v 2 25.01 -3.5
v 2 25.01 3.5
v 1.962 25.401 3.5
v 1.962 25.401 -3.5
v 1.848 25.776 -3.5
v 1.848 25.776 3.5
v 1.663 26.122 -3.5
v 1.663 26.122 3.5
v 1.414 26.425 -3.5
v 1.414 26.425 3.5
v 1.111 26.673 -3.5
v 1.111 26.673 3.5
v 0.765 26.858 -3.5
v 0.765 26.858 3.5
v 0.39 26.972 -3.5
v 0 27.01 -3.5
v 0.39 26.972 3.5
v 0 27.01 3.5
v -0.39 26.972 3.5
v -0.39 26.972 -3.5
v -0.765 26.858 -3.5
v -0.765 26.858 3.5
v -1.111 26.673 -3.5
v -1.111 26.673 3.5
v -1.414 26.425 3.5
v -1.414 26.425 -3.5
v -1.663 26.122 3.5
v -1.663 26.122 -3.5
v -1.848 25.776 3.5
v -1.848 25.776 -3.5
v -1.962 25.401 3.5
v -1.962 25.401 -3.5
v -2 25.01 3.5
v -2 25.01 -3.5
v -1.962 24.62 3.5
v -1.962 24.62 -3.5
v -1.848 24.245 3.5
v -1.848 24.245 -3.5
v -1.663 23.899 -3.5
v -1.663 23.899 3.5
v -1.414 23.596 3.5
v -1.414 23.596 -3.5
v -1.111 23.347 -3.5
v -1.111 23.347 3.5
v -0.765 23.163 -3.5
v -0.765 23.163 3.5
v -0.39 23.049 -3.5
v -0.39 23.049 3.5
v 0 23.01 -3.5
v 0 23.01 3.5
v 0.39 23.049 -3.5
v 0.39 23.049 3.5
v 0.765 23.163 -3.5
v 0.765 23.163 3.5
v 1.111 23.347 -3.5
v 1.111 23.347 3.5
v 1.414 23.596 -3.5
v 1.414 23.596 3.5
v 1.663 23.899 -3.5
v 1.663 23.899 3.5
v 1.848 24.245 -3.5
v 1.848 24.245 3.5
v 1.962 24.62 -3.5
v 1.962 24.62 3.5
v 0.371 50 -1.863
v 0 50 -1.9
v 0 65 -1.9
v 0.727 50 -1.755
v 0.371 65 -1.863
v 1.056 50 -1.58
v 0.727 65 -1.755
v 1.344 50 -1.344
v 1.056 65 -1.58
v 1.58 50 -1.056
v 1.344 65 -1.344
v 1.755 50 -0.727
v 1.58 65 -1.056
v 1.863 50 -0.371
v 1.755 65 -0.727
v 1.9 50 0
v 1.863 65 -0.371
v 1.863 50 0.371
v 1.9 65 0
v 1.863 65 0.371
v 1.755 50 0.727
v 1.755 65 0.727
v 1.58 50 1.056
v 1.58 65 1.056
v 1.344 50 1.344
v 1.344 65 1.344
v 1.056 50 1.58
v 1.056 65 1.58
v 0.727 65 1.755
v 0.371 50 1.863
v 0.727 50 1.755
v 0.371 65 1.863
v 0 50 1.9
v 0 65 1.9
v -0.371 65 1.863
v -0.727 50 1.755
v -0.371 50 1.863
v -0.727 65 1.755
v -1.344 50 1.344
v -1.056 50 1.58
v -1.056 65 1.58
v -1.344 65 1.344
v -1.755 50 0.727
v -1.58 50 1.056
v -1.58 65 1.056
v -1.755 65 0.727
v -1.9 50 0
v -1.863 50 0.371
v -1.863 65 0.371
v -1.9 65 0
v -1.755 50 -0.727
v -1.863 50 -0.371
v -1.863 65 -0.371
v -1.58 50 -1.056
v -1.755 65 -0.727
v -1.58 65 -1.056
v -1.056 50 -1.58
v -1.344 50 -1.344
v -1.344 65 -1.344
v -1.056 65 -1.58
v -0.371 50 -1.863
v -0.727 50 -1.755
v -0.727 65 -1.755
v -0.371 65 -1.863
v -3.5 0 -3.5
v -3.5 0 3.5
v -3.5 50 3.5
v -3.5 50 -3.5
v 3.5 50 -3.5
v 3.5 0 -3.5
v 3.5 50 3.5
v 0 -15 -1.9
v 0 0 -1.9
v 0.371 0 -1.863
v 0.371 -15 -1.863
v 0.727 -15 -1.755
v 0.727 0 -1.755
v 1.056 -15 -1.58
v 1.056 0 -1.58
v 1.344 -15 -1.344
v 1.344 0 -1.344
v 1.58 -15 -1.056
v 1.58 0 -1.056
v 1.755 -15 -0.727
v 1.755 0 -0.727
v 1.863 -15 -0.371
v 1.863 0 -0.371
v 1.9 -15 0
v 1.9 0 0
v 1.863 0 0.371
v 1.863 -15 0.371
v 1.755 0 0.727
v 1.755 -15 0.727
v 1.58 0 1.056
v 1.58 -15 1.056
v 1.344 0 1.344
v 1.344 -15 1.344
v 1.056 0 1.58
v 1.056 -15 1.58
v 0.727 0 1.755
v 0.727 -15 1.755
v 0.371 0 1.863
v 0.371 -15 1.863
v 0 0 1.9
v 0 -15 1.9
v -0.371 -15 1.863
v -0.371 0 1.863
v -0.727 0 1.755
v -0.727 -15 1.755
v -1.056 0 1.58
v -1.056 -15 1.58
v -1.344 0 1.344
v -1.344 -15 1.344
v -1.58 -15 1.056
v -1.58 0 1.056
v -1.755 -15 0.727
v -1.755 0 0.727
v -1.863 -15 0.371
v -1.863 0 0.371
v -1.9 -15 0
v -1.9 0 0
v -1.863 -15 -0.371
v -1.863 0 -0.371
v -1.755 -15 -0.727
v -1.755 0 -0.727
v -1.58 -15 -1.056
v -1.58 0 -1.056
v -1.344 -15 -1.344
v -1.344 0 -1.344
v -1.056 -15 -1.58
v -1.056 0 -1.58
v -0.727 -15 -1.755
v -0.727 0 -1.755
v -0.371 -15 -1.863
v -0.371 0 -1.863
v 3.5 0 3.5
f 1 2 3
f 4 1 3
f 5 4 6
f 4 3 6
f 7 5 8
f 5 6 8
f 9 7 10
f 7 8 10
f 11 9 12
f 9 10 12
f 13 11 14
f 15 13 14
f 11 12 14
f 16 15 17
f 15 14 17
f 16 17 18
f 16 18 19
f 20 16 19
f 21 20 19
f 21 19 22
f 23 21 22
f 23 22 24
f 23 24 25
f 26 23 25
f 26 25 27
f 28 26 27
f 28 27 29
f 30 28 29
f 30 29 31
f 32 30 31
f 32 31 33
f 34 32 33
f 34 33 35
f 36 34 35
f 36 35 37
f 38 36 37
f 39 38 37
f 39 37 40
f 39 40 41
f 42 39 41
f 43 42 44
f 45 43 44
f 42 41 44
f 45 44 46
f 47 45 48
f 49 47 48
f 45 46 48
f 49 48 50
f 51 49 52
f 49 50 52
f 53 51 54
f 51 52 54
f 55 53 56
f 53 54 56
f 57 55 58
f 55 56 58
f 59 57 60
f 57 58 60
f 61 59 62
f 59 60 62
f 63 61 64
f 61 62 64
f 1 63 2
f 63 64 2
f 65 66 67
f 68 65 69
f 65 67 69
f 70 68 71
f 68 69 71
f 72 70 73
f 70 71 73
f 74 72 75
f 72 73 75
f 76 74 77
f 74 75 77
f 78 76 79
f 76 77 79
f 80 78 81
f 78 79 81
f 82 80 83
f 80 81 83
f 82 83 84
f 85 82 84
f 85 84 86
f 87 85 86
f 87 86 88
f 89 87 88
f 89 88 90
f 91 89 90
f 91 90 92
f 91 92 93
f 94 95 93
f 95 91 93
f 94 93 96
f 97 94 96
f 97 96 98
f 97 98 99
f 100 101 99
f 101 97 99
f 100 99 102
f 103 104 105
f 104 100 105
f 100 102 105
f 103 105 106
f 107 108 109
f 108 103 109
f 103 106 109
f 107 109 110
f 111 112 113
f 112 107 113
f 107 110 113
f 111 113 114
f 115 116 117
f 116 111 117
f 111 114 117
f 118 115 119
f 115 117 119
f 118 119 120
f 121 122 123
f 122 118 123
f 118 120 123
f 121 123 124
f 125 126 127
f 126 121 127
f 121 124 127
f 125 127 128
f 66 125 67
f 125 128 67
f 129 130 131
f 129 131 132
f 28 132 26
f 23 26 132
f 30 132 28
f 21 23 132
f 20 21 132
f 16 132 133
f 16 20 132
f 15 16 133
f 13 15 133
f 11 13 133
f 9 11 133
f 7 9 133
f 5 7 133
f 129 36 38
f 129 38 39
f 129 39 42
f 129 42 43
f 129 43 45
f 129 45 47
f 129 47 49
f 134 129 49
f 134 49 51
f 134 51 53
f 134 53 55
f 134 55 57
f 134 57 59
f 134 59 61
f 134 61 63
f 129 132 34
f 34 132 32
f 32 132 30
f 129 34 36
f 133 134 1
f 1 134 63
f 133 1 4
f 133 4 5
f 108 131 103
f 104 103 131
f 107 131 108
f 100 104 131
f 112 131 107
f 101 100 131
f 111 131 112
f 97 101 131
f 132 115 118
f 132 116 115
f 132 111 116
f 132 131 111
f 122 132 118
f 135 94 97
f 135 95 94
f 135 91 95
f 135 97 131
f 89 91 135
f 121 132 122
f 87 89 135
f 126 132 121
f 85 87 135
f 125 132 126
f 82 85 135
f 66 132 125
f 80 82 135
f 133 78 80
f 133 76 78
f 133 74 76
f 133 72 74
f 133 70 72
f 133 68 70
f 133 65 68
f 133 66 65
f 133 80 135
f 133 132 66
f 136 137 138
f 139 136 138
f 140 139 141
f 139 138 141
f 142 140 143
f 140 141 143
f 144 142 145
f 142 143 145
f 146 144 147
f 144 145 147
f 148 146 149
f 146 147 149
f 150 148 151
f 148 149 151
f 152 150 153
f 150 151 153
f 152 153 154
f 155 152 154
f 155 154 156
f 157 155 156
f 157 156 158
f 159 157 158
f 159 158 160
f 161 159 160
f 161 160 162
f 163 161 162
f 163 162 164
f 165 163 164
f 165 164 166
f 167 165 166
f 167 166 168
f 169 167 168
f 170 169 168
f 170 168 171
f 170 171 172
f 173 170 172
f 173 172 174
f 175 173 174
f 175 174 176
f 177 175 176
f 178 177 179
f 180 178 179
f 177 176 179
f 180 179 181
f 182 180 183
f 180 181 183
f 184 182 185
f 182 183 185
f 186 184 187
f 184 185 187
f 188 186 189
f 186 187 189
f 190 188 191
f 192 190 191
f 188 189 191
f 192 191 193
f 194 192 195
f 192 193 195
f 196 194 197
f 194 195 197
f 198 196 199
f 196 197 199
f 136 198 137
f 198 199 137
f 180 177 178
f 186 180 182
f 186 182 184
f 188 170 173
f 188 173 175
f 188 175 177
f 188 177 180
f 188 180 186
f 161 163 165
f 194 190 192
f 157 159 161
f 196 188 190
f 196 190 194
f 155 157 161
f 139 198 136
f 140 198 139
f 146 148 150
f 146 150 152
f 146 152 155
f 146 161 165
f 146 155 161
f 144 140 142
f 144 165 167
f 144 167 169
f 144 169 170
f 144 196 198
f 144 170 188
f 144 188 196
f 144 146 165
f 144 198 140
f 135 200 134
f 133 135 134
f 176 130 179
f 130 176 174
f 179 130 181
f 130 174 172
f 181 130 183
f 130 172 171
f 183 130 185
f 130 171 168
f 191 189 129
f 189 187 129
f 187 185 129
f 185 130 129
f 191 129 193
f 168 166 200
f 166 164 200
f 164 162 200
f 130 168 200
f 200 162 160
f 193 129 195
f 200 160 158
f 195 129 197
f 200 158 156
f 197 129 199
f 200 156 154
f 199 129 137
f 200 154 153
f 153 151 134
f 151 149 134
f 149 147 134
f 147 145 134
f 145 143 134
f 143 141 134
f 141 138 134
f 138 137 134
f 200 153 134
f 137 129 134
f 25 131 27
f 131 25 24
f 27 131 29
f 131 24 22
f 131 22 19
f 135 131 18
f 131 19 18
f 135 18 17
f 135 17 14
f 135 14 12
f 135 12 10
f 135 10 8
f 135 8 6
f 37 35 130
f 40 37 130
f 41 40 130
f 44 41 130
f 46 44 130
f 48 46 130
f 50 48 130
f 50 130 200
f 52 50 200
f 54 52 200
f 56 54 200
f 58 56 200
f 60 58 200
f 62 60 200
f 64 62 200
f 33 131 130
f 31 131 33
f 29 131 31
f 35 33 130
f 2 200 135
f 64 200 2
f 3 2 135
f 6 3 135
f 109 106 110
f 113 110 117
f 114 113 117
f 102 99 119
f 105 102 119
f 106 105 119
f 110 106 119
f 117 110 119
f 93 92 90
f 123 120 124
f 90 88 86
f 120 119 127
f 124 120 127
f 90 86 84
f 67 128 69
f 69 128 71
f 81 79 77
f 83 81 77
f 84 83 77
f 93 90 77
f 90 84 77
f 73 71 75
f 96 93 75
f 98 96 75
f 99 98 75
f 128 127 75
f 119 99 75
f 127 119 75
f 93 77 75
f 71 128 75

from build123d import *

# Parameters (mm, degrees)
SKETCH2_W                = 7
SKETCH2_H                = 7
BOSS_EXTRUDE1_DEPTH      = 50
BOSS_EXTRUDE3_DEPTH      = 15
BOSS_EXTRUDE3_DEPTH_BACK = 65
SKETCH3_R                = 1.9
SKETCH4_R                = 2
CUT_EXTRUDE1_DEPTH       = 10


with BuildPart() as part:
    # Sketch2 → Boss-Extrude1 (new body)
    with BuildSketch(Plane(origin=(0, 0, 0), x_dir=(1, 0, 0), z_dir=(0, 1, 0))):
        Rectangle(SKETCH2_W, SKETCH2_H)
    extrude(amount=BOSS_EXTRUDE1_DEPTH)

    # Sketch3 → Boss-Extrude3 (add, two sides: drawn at the far end of the back side and taken through both)
    with BuildSketch(Plane.XZ.offset(-BOSS_EXTRUDE3_DEPTH_BACK)):
        with Locations(Location((0, 0, 0), (0, 0, 270))):
            Circle(SKETCH3_R)
    extrude(amount=BOSS_EXTRUDE3_DEPTH + BOSS_EXTRUDE3_DEPTH_BACK)

    # Sketch4 → Cut-Extrude1 (cut)
    with BuildSketch(Plane.XY.offset(3.5)):
        with Locations((0, 25.010433152)):
            Circle(SKETCH4_R)
    extrude(amount=-CUT_EXTRUDE1_DEPTH, mode=Mode.SUBTRACT)


solid = part.part
